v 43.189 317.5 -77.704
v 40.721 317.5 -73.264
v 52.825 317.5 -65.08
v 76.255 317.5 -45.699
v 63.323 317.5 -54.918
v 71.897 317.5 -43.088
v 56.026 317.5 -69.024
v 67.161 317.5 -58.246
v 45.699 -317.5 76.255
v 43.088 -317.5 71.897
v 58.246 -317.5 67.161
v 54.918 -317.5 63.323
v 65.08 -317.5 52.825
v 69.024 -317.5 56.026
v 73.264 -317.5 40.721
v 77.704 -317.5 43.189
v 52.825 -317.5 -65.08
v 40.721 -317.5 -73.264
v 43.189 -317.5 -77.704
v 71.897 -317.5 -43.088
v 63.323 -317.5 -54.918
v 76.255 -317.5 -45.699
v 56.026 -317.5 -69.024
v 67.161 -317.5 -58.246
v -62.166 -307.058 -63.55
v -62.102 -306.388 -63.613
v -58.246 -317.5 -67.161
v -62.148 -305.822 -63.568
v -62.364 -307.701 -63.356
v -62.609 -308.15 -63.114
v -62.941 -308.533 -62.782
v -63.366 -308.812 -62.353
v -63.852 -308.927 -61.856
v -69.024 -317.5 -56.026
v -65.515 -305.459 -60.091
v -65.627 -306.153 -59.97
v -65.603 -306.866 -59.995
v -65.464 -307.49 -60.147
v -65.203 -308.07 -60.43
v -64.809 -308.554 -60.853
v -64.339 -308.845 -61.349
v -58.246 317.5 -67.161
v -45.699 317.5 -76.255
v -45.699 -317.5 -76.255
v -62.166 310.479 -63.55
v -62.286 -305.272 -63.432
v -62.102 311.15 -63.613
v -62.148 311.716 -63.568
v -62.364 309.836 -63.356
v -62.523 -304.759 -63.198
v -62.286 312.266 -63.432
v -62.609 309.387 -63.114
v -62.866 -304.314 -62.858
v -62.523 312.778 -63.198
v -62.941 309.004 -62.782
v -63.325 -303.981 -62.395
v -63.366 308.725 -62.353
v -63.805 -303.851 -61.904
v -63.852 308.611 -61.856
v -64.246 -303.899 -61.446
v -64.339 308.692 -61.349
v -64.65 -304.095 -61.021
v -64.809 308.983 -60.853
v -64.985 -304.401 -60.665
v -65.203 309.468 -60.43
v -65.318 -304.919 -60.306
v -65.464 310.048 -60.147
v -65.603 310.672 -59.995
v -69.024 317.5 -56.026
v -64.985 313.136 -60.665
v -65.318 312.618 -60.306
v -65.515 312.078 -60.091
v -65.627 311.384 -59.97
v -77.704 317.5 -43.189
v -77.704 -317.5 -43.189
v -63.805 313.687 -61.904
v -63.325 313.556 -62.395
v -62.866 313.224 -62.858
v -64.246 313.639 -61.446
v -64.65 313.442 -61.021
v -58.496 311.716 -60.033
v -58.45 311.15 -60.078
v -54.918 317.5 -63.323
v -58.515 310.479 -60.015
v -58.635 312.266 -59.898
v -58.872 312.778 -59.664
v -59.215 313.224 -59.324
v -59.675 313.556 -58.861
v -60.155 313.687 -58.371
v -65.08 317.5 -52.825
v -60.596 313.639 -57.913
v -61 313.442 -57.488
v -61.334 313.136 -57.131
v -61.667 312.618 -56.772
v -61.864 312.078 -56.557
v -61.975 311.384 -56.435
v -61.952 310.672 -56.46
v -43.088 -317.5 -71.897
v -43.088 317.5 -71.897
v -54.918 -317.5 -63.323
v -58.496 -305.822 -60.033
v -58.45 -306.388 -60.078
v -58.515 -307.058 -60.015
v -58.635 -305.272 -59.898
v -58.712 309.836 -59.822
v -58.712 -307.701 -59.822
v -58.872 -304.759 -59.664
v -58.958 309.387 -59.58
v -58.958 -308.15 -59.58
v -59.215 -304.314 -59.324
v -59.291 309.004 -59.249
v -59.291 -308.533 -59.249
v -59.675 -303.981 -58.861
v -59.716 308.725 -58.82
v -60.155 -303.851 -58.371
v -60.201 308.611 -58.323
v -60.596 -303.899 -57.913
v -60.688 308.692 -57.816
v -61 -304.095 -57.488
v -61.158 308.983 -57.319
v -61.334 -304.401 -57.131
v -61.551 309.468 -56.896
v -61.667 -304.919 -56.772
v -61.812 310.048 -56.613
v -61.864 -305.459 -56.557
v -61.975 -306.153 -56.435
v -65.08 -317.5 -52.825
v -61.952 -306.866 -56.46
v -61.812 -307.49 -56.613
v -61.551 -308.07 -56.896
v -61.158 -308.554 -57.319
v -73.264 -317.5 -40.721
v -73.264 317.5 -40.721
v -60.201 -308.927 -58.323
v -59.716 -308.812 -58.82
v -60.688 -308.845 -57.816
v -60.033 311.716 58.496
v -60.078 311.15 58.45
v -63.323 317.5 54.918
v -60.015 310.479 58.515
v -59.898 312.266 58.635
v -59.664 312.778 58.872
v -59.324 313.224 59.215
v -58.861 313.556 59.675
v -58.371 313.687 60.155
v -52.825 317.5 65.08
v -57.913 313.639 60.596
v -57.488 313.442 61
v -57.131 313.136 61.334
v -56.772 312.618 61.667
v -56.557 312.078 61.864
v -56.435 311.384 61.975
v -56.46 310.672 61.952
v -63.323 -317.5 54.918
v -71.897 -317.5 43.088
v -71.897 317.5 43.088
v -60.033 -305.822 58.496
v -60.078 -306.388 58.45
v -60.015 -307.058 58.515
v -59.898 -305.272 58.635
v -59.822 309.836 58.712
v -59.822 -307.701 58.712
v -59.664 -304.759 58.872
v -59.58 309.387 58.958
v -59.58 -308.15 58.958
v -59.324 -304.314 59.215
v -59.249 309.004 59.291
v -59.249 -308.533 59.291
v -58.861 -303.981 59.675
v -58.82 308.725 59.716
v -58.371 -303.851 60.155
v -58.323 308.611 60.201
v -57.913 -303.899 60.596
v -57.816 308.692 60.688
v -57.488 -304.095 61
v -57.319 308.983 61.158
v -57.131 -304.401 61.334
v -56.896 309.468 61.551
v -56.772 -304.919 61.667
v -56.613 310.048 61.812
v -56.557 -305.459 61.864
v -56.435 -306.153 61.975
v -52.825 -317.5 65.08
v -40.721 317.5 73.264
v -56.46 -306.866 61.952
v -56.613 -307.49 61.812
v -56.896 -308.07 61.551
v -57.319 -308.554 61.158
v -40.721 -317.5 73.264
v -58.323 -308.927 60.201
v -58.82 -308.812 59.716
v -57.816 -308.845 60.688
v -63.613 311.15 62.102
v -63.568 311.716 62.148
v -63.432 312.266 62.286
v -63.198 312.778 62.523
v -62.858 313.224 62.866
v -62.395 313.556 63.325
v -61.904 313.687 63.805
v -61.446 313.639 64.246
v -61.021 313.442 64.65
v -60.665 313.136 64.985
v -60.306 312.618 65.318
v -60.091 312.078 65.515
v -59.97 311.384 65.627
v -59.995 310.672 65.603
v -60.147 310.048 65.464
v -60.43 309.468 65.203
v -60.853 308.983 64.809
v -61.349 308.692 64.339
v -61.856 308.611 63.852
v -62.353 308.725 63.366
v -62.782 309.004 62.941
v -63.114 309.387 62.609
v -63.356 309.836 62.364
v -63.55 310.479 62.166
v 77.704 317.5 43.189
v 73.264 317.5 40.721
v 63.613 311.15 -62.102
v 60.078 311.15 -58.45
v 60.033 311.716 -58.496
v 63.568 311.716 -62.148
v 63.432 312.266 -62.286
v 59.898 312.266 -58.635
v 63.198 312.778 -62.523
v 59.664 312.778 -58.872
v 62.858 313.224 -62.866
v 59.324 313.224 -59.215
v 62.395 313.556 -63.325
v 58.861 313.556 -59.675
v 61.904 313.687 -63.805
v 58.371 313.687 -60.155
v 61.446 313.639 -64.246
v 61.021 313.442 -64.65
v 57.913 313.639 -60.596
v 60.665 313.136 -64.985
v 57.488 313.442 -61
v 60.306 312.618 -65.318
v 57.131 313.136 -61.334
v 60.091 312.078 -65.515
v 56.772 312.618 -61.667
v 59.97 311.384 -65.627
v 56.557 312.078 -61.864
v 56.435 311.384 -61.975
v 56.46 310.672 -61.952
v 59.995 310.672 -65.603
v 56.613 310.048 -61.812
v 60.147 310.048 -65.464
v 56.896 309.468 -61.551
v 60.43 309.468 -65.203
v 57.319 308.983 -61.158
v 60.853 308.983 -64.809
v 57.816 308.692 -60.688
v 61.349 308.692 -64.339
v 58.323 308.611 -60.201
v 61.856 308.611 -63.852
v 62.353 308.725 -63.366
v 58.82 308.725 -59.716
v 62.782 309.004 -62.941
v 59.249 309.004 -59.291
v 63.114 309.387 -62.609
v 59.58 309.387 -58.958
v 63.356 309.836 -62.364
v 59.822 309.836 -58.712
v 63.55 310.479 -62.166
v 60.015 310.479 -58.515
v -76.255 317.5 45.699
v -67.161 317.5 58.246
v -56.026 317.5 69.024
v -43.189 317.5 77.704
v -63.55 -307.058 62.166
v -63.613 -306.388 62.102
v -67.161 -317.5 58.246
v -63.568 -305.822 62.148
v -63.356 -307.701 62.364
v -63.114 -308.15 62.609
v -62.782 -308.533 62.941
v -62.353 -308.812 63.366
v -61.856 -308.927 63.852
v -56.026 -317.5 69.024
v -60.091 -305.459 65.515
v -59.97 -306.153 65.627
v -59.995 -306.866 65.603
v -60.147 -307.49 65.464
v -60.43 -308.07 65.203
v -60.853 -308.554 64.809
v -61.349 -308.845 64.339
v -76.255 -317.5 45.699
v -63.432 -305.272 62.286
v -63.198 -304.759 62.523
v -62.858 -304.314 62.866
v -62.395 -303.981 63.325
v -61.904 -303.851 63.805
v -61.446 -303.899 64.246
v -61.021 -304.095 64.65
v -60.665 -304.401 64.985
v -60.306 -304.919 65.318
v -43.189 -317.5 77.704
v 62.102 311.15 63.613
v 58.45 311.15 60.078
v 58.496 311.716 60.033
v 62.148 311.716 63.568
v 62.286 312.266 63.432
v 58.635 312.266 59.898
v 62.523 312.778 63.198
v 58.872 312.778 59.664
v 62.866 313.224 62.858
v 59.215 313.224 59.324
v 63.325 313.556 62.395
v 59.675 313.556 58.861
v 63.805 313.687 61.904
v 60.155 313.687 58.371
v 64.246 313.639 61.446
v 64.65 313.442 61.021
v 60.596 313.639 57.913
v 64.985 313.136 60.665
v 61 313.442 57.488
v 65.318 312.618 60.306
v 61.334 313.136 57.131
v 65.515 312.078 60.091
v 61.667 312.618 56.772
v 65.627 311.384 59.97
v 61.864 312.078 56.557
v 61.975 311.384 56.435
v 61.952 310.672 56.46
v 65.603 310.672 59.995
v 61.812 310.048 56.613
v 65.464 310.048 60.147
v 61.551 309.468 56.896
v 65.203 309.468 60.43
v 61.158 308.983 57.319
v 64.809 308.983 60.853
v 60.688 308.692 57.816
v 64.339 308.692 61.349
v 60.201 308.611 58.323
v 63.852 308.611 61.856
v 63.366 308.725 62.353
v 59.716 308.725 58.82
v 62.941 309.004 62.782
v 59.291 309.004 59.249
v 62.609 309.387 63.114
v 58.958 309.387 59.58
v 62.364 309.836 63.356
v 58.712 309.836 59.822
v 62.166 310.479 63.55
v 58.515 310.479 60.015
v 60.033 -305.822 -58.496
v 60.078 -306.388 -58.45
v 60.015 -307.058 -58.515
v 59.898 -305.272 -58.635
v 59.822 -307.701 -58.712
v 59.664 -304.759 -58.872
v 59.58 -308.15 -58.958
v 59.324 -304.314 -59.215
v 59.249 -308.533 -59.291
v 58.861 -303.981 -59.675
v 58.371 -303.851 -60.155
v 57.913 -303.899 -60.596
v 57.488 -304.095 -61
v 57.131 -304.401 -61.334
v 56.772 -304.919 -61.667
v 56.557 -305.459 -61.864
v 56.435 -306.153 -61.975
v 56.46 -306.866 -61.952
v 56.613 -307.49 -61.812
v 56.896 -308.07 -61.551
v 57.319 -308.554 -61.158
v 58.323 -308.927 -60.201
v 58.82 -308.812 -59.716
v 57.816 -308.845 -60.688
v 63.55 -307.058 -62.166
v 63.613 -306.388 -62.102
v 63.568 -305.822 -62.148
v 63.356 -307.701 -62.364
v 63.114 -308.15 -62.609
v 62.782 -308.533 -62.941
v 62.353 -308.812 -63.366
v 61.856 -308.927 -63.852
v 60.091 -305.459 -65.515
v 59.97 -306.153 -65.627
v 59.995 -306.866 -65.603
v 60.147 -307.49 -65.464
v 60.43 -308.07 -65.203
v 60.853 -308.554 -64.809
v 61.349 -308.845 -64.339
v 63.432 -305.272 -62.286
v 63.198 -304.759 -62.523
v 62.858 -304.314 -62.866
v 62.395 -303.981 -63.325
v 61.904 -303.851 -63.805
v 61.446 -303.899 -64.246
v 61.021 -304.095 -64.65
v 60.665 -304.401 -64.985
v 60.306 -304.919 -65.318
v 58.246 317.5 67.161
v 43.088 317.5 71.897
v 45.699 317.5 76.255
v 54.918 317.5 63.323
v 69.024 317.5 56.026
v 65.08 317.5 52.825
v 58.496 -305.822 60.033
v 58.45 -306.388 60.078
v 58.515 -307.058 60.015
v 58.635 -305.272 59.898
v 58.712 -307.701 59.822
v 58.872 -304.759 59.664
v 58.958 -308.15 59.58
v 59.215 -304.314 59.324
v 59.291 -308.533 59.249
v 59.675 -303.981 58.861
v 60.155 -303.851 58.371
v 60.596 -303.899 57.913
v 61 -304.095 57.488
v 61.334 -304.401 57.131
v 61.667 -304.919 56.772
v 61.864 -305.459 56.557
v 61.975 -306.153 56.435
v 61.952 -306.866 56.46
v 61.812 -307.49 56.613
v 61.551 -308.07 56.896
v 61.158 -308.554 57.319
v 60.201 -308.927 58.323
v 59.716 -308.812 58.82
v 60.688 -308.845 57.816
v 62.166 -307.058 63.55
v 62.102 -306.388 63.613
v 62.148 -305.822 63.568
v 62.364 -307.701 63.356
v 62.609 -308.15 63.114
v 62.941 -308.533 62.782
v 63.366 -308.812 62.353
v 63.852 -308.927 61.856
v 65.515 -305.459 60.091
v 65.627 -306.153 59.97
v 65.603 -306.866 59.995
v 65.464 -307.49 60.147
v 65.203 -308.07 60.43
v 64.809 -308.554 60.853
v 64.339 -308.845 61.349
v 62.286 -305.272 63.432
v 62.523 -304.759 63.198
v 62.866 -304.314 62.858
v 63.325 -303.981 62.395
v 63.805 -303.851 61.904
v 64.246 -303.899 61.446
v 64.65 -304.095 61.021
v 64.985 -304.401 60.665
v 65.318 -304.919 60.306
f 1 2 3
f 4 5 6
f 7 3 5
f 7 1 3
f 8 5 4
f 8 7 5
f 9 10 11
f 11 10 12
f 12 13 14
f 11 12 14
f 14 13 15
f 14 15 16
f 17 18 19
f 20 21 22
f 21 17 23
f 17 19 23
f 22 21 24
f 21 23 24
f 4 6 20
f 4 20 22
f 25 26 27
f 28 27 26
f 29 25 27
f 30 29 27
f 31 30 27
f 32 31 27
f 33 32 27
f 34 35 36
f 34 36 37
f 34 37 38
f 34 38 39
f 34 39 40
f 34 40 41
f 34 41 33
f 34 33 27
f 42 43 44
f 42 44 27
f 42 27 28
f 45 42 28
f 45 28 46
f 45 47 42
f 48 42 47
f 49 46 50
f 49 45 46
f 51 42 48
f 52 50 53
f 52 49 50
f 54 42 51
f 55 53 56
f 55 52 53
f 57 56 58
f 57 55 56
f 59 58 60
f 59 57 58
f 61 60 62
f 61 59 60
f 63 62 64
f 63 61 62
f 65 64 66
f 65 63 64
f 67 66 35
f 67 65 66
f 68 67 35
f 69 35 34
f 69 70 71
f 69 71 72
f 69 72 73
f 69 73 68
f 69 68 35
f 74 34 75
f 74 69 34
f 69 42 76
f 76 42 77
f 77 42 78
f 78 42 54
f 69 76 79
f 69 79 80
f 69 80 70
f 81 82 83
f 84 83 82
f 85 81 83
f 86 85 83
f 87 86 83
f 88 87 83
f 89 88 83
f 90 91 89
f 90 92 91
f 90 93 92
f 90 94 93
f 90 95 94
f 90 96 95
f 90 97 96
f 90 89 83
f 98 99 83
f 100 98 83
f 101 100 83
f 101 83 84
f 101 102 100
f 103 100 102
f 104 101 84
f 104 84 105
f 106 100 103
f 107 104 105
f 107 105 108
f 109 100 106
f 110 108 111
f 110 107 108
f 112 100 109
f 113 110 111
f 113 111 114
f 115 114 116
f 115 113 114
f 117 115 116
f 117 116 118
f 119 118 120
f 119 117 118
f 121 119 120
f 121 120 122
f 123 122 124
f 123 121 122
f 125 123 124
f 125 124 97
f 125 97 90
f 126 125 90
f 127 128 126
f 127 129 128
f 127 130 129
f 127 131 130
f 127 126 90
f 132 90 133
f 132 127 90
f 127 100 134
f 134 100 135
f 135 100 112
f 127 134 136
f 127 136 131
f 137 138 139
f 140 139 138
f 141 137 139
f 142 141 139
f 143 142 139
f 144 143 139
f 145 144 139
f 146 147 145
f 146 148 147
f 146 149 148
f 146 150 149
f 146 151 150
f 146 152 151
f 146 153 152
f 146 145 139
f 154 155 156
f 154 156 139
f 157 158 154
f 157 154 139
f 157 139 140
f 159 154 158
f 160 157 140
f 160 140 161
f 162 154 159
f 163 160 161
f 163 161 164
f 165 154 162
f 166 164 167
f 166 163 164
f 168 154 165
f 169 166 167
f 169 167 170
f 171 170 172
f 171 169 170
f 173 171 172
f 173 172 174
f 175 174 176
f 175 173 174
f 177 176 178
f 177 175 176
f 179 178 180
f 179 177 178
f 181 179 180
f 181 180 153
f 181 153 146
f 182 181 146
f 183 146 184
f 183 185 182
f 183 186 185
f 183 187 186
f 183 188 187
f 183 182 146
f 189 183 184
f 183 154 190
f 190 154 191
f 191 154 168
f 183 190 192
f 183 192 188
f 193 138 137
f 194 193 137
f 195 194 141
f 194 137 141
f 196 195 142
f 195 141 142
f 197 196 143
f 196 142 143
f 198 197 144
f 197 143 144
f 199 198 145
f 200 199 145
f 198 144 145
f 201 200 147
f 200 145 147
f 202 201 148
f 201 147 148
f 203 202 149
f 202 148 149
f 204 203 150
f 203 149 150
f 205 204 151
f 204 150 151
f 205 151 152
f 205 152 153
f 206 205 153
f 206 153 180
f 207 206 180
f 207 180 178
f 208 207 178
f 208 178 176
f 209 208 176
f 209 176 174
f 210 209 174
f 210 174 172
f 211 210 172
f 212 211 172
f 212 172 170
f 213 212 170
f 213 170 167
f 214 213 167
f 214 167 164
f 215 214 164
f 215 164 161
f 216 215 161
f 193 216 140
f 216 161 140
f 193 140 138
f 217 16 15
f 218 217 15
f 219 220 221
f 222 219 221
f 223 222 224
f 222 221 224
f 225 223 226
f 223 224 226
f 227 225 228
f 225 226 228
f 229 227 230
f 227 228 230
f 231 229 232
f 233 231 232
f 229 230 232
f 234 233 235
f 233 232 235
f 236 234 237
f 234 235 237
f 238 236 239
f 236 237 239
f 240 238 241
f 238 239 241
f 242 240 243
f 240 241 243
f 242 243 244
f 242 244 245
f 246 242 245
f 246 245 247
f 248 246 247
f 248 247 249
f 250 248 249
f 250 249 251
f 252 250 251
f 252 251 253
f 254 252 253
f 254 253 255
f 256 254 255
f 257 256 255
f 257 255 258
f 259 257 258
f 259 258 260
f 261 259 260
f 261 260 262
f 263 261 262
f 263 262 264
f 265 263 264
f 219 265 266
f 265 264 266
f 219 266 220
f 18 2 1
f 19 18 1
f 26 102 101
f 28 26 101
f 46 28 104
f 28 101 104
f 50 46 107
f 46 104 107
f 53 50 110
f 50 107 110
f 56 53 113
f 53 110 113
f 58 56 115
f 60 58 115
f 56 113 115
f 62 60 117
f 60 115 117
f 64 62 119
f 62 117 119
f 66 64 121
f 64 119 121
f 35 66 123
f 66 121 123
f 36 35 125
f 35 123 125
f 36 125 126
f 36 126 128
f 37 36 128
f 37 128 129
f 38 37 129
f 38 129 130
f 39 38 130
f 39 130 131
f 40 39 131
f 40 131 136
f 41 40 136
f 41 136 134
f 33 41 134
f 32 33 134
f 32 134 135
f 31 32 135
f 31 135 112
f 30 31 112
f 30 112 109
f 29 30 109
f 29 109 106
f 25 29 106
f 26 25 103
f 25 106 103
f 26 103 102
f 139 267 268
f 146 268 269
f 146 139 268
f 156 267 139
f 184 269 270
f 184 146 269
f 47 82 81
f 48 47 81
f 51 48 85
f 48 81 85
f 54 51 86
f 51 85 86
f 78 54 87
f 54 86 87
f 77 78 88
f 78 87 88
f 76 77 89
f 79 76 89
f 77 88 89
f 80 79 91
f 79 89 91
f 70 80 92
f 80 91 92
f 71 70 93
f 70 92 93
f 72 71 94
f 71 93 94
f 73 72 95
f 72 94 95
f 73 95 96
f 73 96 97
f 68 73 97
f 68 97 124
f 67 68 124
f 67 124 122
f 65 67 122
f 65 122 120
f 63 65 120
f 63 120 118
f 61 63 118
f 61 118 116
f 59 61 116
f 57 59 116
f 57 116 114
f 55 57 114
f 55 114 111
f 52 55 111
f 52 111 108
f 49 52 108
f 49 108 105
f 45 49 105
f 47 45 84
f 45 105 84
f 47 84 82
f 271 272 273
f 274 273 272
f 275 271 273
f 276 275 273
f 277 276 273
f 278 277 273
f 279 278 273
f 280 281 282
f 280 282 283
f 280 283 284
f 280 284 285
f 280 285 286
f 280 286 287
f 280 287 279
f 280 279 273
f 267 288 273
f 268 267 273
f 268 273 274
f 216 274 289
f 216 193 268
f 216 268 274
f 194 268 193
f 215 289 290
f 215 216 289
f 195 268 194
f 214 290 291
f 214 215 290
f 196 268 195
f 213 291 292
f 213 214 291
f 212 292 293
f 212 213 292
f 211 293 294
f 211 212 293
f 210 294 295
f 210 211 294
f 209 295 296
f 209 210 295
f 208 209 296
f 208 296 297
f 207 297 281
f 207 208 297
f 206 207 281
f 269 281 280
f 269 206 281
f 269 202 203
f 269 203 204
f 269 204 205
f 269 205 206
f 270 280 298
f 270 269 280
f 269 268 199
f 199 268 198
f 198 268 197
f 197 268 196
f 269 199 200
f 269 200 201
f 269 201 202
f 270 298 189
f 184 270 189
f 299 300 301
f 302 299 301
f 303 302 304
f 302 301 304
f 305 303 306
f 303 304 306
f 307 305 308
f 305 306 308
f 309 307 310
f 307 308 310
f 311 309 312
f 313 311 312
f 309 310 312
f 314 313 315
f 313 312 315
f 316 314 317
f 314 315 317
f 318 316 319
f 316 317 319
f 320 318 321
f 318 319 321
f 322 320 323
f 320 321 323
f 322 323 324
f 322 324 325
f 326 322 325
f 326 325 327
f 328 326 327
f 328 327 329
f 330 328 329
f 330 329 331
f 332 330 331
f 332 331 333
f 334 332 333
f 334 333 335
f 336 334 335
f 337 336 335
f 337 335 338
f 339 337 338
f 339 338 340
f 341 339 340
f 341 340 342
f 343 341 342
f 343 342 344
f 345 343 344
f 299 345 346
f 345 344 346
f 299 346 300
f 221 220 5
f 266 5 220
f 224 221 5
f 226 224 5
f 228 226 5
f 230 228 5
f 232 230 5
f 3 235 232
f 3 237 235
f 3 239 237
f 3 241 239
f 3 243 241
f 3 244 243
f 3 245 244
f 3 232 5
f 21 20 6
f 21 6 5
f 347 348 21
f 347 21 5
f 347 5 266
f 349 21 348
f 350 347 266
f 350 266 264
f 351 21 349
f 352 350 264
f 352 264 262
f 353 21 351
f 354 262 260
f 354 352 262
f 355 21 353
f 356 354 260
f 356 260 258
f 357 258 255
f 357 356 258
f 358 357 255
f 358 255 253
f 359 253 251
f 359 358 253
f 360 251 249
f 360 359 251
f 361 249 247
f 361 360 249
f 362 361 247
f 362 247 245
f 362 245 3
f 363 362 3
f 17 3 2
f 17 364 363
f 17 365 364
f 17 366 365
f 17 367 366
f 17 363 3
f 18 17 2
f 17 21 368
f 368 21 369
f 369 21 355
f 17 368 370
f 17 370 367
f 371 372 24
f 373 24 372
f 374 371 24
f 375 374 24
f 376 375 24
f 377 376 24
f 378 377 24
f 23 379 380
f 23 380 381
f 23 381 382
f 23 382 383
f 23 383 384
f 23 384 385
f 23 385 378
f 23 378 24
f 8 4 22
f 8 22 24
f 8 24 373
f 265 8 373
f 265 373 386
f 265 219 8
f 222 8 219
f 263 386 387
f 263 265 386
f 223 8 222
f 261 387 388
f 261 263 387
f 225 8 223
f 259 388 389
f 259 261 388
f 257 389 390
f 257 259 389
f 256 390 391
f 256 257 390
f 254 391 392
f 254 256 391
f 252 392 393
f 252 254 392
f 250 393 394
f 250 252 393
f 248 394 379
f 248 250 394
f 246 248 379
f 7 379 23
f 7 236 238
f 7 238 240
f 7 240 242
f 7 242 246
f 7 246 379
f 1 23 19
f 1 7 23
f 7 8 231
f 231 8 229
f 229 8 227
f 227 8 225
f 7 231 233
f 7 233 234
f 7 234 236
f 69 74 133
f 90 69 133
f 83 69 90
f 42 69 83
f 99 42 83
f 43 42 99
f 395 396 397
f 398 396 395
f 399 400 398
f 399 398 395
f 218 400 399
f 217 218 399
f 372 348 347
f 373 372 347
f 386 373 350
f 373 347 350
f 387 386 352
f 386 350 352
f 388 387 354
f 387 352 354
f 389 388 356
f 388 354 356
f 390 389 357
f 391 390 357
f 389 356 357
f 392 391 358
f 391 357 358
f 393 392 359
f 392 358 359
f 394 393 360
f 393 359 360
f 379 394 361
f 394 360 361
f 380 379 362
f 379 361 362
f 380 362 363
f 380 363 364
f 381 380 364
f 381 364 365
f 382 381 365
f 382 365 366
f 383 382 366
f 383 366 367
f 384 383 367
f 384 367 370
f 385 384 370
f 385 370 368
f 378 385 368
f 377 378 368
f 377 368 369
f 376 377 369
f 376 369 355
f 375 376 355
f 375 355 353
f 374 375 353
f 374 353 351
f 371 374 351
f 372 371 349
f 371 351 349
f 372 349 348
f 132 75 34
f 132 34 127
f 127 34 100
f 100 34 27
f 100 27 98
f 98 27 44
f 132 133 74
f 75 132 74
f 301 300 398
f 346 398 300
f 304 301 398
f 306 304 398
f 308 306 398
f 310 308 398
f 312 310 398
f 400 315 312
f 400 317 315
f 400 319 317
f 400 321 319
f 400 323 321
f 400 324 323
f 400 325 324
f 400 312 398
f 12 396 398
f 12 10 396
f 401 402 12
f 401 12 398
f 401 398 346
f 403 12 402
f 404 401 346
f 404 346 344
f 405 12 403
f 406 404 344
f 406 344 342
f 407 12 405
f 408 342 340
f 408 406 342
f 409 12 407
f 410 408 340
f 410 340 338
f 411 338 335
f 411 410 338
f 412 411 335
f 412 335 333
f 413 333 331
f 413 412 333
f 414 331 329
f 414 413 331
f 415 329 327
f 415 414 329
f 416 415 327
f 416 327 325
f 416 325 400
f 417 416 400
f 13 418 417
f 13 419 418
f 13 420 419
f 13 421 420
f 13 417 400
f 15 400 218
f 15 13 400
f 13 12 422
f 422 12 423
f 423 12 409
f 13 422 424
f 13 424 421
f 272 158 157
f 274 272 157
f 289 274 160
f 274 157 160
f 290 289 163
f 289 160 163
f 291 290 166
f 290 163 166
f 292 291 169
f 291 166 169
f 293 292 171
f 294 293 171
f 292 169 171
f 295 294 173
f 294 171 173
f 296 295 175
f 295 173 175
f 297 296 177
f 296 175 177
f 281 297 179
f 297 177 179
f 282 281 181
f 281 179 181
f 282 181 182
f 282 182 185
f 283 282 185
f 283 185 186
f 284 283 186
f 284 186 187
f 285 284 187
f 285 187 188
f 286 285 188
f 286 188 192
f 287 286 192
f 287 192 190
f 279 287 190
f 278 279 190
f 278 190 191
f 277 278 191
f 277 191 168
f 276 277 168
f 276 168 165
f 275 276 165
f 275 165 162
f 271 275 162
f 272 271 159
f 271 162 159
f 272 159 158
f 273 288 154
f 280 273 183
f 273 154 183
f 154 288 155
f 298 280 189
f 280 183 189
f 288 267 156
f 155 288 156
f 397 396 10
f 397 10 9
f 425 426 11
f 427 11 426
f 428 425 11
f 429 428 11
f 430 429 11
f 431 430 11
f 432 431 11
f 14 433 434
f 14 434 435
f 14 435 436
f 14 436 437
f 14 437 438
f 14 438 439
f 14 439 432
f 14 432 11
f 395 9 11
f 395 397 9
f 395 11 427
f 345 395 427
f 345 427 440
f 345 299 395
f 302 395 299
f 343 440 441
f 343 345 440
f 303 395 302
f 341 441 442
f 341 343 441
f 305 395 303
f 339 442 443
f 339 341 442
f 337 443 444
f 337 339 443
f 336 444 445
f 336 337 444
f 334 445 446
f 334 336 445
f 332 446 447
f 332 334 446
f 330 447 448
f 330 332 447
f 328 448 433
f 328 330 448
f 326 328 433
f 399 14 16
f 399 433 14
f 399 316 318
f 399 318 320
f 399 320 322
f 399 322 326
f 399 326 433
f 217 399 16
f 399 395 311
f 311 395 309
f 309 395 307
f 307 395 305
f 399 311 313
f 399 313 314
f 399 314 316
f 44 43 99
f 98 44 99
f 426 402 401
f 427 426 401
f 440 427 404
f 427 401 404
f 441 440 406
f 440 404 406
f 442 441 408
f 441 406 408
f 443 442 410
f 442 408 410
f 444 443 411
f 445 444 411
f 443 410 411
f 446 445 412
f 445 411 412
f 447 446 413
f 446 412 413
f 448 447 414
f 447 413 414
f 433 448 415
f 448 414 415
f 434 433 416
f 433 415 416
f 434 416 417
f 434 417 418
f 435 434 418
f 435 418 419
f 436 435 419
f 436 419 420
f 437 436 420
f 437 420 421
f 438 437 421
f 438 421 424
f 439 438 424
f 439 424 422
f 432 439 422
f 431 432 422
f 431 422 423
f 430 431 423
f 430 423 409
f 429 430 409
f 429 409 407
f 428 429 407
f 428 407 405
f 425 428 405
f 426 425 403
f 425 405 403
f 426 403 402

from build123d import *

# Parameters (mm, degrees)
SKETCH2_R               = 88.9
SKETCH2_R_2             = 83.82
BOSS_EXTRUDE1_DEPTH     = 317.5
CUT_EXTRUDE1_DEPTH      = 318.5
CUT_EXTRUDE1_DEPTH_BACK = 318.5
SKETCH5_R               = 2.54
BOLT_HOLES_DEPTH        = 29.911624556
BOLT_PATTERN_COUNT      = 4


with BuildPart() as part:
    # Sketch2 → Boss-Extrude1 (new body, symmetric)
    with BuildSketch(Plane(origin=(0, 0, 0), x_dir=(1, 0, 0), z_dir=(0, 1, 0))):
        Circle(SKETCH2_R)
        Circle(SKETCH2_R_2, mode=Mode.SUBTRACT)
    extrude(amount=BOSS_EXTRUDE1_DEPTH, both=True)

    # Sketch3 → Cut-Extrude1 (cut, two sides)
    with BuildSketch(Plane(origin=(0, 0, 0), x_dir=(1, 0, 0), z_dir=(0, 1, 0))) as cut_extrude1_sk:
        Polygon((169.661755759, -94.300371224), (0, 0), (169.661755759, 101.677593364), align=None)
        Polygon((0, 0), (53.900027233, 96.974944394), (-58.116685864, 96.974944394), align=None)
        Polygon((-123.741299607, 68.777140945), (-123.741299607, -74.157652604), (0, 0), align=None)
        Polygon((-65.840936026, -118.45858783), (0, 0), (70.991745134, -118.45858783), align=None)
    extrude(amount=CUT_EXTRUDE1_DEPTH, mode=Mode.SUBTRACT)
    extrude(cut_extrude1_sk.sketch, amount=-CUT_EXTRUDE1_DEPTH_BACK, mode=Mode.SUBTRACT)

    # Sketch5 → Bolt holes (cut, through all)
    with BuildSketch(Plane(origin=(-56.309218645, 0, 58.175814955), x_dir=(-0.718540152, 0, -0.695485478), z_dir=(0.695485478, 0, -0.718540152))):
        with Locations((-0.02278764, 311.15)):
            Circle(SKETCH5_R)
        with Locations((-0.02278764, -306.3875)):
            Circle(SKETCH5_R)
    bolt_holes = extrude(amount=-BOLT_HOLES_DEPTH, mode=Mode.SUBTRACT)

    # Bolt pattern: Bolt holes ×4 about axis
    bolt_pattern_axis = Axis((0, 317.5, 0), (0, 1, 0))
    for i in range(1, BOLT_PATTERN_COUNT):
        add(bolt_holes.rotate(bolt_pattern_axis, i * 360 / BOLT_PATTERN_COUNT), mode=Mode.SUBTRACT)


solid = part.part
